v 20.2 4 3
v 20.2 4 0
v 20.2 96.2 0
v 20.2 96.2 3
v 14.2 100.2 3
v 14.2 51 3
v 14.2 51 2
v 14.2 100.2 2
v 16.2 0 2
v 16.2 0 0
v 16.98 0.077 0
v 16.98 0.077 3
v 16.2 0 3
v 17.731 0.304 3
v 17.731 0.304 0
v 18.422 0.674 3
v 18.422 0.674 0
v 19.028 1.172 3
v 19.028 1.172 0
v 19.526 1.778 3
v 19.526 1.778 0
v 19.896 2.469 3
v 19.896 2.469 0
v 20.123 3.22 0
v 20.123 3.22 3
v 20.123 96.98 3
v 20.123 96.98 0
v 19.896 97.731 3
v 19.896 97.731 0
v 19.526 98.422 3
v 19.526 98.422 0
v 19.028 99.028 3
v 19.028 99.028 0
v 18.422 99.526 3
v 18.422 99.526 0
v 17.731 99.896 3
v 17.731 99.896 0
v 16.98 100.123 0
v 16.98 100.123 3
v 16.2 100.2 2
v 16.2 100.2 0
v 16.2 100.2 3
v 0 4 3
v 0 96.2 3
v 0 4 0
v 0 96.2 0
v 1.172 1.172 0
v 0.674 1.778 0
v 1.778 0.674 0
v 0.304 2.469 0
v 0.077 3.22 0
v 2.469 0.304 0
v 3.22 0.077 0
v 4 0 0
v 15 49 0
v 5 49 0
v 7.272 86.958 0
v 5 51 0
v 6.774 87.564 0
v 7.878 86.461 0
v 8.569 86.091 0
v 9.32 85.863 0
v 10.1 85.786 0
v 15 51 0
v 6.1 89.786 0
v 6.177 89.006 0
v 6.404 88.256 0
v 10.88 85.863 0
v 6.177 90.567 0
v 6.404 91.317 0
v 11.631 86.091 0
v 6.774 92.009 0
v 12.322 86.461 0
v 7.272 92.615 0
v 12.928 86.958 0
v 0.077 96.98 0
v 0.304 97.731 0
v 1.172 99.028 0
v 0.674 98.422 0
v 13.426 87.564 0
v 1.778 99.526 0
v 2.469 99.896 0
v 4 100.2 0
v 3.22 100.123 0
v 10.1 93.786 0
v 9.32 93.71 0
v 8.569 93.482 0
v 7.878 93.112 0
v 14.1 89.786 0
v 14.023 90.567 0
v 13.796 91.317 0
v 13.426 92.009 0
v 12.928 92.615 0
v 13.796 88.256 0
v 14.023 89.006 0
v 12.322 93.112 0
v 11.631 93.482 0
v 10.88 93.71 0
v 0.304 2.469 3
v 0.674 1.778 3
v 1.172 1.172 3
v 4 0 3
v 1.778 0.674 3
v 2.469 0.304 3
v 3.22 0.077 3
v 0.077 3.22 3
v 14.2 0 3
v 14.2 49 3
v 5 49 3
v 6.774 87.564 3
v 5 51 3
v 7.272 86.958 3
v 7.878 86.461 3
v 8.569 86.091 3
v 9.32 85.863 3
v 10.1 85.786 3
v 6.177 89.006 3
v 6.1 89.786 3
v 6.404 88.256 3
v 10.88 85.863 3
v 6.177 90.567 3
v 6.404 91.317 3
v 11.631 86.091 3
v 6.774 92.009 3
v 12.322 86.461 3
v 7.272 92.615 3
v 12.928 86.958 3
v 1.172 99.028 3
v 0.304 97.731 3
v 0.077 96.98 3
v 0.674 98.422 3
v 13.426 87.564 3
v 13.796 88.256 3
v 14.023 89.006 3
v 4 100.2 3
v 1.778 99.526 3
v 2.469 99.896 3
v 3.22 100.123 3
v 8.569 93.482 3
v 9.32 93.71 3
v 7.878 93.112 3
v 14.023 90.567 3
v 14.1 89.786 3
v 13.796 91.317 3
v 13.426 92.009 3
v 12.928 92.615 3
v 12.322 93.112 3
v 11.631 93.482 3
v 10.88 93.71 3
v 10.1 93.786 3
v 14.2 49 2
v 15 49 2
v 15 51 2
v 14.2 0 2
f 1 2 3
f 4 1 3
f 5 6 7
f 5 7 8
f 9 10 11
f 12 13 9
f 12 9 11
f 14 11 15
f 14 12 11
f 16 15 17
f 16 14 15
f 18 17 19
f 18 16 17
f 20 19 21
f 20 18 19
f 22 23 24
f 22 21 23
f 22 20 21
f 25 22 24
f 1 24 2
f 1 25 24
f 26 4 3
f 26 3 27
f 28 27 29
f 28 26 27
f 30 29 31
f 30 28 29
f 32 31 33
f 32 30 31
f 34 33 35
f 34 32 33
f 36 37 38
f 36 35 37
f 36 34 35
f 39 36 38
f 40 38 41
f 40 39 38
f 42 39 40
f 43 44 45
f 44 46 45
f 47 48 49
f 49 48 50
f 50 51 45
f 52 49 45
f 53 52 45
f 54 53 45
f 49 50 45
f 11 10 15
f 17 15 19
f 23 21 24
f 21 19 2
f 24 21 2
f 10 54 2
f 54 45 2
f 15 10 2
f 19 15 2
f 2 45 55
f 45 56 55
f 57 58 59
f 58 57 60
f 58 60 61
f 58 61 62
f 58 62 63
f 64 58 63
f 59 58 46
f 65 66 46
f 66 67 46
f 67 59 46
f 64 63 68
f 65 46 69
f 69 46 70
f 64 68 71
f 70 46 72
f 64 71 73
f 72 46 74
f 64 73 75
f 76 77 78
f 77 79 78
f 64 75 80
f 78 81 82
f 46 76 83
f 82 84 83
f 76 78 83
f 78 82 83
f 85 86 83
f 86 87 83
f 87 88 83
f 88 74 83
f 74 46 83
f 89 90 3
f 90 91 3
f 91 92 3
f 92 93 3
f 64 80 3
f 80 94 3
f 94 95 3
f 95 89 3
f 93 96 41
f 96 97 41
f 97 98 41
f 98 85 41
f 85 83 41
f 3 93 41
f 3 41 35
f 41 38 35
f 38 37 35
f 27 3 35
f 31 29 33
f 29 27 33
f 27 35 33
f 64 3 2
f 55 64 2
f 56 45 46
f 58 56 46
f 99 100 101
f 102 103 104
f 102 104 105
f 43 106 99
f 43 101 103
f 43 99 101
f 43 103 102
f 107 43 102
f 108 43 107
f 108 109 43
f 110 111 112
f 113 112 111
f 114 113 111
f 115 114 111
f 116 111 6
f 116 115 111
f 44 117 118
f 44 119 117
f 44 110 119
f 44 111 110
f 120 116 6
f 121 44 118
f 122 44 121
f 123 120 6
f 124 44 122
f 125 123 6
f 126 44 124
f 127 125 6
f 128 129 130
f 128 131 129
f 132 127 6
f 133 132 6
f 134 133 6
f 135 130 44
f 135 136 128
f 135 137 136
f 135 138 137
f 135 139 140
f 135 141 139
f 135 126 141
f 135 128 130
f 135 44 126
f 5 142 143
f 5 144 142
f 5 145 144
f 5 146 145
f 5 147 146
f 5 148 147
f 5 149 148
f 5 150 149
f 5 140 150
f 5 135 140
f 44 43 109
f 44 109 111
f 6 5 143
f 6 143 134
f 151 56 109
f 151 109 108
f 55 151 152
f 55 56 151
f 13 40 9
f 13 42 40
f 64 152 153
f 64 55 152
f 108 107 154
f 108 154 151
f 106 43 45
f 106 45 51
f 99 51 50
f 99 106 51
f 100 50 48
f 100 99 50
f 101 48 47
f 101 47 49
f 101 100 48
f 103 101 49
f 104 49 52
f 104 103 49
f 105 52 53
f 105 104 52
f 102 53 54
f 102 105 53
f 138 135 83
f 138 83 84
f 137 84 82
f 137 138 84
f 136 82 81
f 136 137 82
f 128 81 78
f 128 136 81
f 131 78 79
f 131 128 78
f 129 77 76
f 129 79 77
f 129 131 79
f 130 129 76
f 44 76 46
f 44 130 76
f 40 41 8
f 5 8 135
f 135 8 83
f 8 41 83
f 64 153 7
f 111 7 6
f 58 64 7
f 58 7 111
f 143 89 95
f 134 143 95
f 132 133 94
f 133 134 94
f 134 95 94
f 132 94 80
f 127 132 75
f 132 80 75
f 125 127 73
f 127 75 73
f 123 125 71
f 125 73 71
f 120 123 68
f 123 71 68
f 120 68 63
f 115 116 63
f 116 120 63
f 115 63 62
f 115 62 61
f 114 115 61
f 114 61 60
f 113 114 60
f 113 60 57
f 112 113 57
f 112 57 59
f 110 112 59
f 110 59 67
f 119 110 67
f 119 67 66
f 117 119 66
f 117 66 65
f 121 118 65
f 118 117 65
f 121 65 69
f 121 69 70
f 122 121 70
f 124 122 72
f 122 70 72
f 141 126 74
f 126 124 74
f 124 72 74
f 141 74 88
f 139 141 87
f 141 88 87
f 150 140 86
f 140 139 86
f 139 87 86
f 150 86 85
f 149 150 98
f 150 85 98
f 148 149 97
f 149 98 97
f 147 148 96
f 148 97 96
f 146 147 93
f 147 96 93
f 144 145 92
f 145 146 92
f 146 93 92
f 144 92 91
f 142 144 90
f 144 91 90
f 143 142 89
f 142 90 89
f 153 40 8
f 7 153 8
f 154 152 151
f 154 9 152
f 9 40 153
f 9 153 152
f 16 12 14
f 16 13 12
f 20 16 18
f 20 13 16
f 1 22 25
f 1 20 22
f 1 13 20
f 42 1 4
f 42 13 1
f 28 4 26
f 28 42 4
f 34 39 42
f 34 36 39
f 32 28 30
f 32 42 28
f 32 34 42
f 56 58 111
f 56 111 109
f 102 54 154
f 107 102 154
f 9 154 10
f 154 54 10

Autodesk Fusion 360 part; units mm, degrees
sketch "Sketch1" plane through (0, 0, 0) normal (0, 0, 1) x (1, 0, 0)
  line L0 (0, 0) -> (20.2, 0)
  line L1 (20.2, 0) -> (20.2, 100.2)
  line L2 (20.2, 100.2) -> (0, 100.2)
  line L3 (0, 100.2) -> (0, 0)
  circle A0 centre (10.1, 89.7864) radius 4
  line L4 (15, 51) -> (5, 51)
  line L5 (5, 51) -> (5, 49)
  line L6 (5, 49) -> (15, 49)
  line L7 (15, 49) -> (15, 51)
  line L8 (15, 51) -> (5, 49) construction
  line L9 (5, 51) -> (15, 49) construction
  line L10 (10.1, 100.2) -> (10.1, 0) construction
  point P0 (10, 50)
  dimension "d1" = 20.2
  dimension "d2" = 100.2
  dimension "d8" = 8
  dimension "d9" = 10
  dimension "d10" = 2
extrude "Extrude1" add sketch "Sketch1" along normal blind 3
fillet "Fillet1" radius 4 4 edges at (20.2, 0, 1.5) (20.2, 100.2, 1.5) (0, 100.2, 1.5) (0, 0, 1.5)
sketch "Sketch2" plane through (0, 0, 3) normal (0, 0, 1) x (-1, 0, 0)
  arc A0 (0, -4) -> (-4, 0) centre (-4, -4) ccw
  line L0 (-4, 0) -> (-16.2, 0)
  arc A1 (-16.2, 0) -> (-20.2, -4) centre (-16.2, -4) ccw
  line L1 (-20.2, -4) -> (-20.2, -96.2)
  arc A2 (-20.2, -96.2) -> (-16.2, -100.2) centre (-16.2, -96.2) ccw
  line L2 (-16.2, -100.2) -> (-4, -100.2)
  arc A3 (-4, -100.2) -> (0, -96.2) centre (-4, -96.2) ccw
  line L3 (0, -96.2) -> (0, -4)
  line L4 (-15, -51) -> (-15, -49)
  line L5 (-15, -49) -> (-5, -49)
  line L6 (-5, -49) -> (-5, -51)
  line L7 (-5, -51) -> (-15, -51)
  circle A4 centre (-10.1, -89.7864) radius 4
  line L8 (-16.2, 0) -> (-14.2, 0)
  line L9 (-14.2, 0) -> (-14.2, -100.2)
  line L10 (-14.2, -100.2) -> (-16.2, -100.2)
  line L11 (-16.2, -100.2) -> (-16.2, 0)
  dimension "d11" = 2
extrude "Extrude2" cut sketch "Sketch2" against normal blind 1 contours L0 L2 L4 L5 L7 L8 L9 L10 L11
